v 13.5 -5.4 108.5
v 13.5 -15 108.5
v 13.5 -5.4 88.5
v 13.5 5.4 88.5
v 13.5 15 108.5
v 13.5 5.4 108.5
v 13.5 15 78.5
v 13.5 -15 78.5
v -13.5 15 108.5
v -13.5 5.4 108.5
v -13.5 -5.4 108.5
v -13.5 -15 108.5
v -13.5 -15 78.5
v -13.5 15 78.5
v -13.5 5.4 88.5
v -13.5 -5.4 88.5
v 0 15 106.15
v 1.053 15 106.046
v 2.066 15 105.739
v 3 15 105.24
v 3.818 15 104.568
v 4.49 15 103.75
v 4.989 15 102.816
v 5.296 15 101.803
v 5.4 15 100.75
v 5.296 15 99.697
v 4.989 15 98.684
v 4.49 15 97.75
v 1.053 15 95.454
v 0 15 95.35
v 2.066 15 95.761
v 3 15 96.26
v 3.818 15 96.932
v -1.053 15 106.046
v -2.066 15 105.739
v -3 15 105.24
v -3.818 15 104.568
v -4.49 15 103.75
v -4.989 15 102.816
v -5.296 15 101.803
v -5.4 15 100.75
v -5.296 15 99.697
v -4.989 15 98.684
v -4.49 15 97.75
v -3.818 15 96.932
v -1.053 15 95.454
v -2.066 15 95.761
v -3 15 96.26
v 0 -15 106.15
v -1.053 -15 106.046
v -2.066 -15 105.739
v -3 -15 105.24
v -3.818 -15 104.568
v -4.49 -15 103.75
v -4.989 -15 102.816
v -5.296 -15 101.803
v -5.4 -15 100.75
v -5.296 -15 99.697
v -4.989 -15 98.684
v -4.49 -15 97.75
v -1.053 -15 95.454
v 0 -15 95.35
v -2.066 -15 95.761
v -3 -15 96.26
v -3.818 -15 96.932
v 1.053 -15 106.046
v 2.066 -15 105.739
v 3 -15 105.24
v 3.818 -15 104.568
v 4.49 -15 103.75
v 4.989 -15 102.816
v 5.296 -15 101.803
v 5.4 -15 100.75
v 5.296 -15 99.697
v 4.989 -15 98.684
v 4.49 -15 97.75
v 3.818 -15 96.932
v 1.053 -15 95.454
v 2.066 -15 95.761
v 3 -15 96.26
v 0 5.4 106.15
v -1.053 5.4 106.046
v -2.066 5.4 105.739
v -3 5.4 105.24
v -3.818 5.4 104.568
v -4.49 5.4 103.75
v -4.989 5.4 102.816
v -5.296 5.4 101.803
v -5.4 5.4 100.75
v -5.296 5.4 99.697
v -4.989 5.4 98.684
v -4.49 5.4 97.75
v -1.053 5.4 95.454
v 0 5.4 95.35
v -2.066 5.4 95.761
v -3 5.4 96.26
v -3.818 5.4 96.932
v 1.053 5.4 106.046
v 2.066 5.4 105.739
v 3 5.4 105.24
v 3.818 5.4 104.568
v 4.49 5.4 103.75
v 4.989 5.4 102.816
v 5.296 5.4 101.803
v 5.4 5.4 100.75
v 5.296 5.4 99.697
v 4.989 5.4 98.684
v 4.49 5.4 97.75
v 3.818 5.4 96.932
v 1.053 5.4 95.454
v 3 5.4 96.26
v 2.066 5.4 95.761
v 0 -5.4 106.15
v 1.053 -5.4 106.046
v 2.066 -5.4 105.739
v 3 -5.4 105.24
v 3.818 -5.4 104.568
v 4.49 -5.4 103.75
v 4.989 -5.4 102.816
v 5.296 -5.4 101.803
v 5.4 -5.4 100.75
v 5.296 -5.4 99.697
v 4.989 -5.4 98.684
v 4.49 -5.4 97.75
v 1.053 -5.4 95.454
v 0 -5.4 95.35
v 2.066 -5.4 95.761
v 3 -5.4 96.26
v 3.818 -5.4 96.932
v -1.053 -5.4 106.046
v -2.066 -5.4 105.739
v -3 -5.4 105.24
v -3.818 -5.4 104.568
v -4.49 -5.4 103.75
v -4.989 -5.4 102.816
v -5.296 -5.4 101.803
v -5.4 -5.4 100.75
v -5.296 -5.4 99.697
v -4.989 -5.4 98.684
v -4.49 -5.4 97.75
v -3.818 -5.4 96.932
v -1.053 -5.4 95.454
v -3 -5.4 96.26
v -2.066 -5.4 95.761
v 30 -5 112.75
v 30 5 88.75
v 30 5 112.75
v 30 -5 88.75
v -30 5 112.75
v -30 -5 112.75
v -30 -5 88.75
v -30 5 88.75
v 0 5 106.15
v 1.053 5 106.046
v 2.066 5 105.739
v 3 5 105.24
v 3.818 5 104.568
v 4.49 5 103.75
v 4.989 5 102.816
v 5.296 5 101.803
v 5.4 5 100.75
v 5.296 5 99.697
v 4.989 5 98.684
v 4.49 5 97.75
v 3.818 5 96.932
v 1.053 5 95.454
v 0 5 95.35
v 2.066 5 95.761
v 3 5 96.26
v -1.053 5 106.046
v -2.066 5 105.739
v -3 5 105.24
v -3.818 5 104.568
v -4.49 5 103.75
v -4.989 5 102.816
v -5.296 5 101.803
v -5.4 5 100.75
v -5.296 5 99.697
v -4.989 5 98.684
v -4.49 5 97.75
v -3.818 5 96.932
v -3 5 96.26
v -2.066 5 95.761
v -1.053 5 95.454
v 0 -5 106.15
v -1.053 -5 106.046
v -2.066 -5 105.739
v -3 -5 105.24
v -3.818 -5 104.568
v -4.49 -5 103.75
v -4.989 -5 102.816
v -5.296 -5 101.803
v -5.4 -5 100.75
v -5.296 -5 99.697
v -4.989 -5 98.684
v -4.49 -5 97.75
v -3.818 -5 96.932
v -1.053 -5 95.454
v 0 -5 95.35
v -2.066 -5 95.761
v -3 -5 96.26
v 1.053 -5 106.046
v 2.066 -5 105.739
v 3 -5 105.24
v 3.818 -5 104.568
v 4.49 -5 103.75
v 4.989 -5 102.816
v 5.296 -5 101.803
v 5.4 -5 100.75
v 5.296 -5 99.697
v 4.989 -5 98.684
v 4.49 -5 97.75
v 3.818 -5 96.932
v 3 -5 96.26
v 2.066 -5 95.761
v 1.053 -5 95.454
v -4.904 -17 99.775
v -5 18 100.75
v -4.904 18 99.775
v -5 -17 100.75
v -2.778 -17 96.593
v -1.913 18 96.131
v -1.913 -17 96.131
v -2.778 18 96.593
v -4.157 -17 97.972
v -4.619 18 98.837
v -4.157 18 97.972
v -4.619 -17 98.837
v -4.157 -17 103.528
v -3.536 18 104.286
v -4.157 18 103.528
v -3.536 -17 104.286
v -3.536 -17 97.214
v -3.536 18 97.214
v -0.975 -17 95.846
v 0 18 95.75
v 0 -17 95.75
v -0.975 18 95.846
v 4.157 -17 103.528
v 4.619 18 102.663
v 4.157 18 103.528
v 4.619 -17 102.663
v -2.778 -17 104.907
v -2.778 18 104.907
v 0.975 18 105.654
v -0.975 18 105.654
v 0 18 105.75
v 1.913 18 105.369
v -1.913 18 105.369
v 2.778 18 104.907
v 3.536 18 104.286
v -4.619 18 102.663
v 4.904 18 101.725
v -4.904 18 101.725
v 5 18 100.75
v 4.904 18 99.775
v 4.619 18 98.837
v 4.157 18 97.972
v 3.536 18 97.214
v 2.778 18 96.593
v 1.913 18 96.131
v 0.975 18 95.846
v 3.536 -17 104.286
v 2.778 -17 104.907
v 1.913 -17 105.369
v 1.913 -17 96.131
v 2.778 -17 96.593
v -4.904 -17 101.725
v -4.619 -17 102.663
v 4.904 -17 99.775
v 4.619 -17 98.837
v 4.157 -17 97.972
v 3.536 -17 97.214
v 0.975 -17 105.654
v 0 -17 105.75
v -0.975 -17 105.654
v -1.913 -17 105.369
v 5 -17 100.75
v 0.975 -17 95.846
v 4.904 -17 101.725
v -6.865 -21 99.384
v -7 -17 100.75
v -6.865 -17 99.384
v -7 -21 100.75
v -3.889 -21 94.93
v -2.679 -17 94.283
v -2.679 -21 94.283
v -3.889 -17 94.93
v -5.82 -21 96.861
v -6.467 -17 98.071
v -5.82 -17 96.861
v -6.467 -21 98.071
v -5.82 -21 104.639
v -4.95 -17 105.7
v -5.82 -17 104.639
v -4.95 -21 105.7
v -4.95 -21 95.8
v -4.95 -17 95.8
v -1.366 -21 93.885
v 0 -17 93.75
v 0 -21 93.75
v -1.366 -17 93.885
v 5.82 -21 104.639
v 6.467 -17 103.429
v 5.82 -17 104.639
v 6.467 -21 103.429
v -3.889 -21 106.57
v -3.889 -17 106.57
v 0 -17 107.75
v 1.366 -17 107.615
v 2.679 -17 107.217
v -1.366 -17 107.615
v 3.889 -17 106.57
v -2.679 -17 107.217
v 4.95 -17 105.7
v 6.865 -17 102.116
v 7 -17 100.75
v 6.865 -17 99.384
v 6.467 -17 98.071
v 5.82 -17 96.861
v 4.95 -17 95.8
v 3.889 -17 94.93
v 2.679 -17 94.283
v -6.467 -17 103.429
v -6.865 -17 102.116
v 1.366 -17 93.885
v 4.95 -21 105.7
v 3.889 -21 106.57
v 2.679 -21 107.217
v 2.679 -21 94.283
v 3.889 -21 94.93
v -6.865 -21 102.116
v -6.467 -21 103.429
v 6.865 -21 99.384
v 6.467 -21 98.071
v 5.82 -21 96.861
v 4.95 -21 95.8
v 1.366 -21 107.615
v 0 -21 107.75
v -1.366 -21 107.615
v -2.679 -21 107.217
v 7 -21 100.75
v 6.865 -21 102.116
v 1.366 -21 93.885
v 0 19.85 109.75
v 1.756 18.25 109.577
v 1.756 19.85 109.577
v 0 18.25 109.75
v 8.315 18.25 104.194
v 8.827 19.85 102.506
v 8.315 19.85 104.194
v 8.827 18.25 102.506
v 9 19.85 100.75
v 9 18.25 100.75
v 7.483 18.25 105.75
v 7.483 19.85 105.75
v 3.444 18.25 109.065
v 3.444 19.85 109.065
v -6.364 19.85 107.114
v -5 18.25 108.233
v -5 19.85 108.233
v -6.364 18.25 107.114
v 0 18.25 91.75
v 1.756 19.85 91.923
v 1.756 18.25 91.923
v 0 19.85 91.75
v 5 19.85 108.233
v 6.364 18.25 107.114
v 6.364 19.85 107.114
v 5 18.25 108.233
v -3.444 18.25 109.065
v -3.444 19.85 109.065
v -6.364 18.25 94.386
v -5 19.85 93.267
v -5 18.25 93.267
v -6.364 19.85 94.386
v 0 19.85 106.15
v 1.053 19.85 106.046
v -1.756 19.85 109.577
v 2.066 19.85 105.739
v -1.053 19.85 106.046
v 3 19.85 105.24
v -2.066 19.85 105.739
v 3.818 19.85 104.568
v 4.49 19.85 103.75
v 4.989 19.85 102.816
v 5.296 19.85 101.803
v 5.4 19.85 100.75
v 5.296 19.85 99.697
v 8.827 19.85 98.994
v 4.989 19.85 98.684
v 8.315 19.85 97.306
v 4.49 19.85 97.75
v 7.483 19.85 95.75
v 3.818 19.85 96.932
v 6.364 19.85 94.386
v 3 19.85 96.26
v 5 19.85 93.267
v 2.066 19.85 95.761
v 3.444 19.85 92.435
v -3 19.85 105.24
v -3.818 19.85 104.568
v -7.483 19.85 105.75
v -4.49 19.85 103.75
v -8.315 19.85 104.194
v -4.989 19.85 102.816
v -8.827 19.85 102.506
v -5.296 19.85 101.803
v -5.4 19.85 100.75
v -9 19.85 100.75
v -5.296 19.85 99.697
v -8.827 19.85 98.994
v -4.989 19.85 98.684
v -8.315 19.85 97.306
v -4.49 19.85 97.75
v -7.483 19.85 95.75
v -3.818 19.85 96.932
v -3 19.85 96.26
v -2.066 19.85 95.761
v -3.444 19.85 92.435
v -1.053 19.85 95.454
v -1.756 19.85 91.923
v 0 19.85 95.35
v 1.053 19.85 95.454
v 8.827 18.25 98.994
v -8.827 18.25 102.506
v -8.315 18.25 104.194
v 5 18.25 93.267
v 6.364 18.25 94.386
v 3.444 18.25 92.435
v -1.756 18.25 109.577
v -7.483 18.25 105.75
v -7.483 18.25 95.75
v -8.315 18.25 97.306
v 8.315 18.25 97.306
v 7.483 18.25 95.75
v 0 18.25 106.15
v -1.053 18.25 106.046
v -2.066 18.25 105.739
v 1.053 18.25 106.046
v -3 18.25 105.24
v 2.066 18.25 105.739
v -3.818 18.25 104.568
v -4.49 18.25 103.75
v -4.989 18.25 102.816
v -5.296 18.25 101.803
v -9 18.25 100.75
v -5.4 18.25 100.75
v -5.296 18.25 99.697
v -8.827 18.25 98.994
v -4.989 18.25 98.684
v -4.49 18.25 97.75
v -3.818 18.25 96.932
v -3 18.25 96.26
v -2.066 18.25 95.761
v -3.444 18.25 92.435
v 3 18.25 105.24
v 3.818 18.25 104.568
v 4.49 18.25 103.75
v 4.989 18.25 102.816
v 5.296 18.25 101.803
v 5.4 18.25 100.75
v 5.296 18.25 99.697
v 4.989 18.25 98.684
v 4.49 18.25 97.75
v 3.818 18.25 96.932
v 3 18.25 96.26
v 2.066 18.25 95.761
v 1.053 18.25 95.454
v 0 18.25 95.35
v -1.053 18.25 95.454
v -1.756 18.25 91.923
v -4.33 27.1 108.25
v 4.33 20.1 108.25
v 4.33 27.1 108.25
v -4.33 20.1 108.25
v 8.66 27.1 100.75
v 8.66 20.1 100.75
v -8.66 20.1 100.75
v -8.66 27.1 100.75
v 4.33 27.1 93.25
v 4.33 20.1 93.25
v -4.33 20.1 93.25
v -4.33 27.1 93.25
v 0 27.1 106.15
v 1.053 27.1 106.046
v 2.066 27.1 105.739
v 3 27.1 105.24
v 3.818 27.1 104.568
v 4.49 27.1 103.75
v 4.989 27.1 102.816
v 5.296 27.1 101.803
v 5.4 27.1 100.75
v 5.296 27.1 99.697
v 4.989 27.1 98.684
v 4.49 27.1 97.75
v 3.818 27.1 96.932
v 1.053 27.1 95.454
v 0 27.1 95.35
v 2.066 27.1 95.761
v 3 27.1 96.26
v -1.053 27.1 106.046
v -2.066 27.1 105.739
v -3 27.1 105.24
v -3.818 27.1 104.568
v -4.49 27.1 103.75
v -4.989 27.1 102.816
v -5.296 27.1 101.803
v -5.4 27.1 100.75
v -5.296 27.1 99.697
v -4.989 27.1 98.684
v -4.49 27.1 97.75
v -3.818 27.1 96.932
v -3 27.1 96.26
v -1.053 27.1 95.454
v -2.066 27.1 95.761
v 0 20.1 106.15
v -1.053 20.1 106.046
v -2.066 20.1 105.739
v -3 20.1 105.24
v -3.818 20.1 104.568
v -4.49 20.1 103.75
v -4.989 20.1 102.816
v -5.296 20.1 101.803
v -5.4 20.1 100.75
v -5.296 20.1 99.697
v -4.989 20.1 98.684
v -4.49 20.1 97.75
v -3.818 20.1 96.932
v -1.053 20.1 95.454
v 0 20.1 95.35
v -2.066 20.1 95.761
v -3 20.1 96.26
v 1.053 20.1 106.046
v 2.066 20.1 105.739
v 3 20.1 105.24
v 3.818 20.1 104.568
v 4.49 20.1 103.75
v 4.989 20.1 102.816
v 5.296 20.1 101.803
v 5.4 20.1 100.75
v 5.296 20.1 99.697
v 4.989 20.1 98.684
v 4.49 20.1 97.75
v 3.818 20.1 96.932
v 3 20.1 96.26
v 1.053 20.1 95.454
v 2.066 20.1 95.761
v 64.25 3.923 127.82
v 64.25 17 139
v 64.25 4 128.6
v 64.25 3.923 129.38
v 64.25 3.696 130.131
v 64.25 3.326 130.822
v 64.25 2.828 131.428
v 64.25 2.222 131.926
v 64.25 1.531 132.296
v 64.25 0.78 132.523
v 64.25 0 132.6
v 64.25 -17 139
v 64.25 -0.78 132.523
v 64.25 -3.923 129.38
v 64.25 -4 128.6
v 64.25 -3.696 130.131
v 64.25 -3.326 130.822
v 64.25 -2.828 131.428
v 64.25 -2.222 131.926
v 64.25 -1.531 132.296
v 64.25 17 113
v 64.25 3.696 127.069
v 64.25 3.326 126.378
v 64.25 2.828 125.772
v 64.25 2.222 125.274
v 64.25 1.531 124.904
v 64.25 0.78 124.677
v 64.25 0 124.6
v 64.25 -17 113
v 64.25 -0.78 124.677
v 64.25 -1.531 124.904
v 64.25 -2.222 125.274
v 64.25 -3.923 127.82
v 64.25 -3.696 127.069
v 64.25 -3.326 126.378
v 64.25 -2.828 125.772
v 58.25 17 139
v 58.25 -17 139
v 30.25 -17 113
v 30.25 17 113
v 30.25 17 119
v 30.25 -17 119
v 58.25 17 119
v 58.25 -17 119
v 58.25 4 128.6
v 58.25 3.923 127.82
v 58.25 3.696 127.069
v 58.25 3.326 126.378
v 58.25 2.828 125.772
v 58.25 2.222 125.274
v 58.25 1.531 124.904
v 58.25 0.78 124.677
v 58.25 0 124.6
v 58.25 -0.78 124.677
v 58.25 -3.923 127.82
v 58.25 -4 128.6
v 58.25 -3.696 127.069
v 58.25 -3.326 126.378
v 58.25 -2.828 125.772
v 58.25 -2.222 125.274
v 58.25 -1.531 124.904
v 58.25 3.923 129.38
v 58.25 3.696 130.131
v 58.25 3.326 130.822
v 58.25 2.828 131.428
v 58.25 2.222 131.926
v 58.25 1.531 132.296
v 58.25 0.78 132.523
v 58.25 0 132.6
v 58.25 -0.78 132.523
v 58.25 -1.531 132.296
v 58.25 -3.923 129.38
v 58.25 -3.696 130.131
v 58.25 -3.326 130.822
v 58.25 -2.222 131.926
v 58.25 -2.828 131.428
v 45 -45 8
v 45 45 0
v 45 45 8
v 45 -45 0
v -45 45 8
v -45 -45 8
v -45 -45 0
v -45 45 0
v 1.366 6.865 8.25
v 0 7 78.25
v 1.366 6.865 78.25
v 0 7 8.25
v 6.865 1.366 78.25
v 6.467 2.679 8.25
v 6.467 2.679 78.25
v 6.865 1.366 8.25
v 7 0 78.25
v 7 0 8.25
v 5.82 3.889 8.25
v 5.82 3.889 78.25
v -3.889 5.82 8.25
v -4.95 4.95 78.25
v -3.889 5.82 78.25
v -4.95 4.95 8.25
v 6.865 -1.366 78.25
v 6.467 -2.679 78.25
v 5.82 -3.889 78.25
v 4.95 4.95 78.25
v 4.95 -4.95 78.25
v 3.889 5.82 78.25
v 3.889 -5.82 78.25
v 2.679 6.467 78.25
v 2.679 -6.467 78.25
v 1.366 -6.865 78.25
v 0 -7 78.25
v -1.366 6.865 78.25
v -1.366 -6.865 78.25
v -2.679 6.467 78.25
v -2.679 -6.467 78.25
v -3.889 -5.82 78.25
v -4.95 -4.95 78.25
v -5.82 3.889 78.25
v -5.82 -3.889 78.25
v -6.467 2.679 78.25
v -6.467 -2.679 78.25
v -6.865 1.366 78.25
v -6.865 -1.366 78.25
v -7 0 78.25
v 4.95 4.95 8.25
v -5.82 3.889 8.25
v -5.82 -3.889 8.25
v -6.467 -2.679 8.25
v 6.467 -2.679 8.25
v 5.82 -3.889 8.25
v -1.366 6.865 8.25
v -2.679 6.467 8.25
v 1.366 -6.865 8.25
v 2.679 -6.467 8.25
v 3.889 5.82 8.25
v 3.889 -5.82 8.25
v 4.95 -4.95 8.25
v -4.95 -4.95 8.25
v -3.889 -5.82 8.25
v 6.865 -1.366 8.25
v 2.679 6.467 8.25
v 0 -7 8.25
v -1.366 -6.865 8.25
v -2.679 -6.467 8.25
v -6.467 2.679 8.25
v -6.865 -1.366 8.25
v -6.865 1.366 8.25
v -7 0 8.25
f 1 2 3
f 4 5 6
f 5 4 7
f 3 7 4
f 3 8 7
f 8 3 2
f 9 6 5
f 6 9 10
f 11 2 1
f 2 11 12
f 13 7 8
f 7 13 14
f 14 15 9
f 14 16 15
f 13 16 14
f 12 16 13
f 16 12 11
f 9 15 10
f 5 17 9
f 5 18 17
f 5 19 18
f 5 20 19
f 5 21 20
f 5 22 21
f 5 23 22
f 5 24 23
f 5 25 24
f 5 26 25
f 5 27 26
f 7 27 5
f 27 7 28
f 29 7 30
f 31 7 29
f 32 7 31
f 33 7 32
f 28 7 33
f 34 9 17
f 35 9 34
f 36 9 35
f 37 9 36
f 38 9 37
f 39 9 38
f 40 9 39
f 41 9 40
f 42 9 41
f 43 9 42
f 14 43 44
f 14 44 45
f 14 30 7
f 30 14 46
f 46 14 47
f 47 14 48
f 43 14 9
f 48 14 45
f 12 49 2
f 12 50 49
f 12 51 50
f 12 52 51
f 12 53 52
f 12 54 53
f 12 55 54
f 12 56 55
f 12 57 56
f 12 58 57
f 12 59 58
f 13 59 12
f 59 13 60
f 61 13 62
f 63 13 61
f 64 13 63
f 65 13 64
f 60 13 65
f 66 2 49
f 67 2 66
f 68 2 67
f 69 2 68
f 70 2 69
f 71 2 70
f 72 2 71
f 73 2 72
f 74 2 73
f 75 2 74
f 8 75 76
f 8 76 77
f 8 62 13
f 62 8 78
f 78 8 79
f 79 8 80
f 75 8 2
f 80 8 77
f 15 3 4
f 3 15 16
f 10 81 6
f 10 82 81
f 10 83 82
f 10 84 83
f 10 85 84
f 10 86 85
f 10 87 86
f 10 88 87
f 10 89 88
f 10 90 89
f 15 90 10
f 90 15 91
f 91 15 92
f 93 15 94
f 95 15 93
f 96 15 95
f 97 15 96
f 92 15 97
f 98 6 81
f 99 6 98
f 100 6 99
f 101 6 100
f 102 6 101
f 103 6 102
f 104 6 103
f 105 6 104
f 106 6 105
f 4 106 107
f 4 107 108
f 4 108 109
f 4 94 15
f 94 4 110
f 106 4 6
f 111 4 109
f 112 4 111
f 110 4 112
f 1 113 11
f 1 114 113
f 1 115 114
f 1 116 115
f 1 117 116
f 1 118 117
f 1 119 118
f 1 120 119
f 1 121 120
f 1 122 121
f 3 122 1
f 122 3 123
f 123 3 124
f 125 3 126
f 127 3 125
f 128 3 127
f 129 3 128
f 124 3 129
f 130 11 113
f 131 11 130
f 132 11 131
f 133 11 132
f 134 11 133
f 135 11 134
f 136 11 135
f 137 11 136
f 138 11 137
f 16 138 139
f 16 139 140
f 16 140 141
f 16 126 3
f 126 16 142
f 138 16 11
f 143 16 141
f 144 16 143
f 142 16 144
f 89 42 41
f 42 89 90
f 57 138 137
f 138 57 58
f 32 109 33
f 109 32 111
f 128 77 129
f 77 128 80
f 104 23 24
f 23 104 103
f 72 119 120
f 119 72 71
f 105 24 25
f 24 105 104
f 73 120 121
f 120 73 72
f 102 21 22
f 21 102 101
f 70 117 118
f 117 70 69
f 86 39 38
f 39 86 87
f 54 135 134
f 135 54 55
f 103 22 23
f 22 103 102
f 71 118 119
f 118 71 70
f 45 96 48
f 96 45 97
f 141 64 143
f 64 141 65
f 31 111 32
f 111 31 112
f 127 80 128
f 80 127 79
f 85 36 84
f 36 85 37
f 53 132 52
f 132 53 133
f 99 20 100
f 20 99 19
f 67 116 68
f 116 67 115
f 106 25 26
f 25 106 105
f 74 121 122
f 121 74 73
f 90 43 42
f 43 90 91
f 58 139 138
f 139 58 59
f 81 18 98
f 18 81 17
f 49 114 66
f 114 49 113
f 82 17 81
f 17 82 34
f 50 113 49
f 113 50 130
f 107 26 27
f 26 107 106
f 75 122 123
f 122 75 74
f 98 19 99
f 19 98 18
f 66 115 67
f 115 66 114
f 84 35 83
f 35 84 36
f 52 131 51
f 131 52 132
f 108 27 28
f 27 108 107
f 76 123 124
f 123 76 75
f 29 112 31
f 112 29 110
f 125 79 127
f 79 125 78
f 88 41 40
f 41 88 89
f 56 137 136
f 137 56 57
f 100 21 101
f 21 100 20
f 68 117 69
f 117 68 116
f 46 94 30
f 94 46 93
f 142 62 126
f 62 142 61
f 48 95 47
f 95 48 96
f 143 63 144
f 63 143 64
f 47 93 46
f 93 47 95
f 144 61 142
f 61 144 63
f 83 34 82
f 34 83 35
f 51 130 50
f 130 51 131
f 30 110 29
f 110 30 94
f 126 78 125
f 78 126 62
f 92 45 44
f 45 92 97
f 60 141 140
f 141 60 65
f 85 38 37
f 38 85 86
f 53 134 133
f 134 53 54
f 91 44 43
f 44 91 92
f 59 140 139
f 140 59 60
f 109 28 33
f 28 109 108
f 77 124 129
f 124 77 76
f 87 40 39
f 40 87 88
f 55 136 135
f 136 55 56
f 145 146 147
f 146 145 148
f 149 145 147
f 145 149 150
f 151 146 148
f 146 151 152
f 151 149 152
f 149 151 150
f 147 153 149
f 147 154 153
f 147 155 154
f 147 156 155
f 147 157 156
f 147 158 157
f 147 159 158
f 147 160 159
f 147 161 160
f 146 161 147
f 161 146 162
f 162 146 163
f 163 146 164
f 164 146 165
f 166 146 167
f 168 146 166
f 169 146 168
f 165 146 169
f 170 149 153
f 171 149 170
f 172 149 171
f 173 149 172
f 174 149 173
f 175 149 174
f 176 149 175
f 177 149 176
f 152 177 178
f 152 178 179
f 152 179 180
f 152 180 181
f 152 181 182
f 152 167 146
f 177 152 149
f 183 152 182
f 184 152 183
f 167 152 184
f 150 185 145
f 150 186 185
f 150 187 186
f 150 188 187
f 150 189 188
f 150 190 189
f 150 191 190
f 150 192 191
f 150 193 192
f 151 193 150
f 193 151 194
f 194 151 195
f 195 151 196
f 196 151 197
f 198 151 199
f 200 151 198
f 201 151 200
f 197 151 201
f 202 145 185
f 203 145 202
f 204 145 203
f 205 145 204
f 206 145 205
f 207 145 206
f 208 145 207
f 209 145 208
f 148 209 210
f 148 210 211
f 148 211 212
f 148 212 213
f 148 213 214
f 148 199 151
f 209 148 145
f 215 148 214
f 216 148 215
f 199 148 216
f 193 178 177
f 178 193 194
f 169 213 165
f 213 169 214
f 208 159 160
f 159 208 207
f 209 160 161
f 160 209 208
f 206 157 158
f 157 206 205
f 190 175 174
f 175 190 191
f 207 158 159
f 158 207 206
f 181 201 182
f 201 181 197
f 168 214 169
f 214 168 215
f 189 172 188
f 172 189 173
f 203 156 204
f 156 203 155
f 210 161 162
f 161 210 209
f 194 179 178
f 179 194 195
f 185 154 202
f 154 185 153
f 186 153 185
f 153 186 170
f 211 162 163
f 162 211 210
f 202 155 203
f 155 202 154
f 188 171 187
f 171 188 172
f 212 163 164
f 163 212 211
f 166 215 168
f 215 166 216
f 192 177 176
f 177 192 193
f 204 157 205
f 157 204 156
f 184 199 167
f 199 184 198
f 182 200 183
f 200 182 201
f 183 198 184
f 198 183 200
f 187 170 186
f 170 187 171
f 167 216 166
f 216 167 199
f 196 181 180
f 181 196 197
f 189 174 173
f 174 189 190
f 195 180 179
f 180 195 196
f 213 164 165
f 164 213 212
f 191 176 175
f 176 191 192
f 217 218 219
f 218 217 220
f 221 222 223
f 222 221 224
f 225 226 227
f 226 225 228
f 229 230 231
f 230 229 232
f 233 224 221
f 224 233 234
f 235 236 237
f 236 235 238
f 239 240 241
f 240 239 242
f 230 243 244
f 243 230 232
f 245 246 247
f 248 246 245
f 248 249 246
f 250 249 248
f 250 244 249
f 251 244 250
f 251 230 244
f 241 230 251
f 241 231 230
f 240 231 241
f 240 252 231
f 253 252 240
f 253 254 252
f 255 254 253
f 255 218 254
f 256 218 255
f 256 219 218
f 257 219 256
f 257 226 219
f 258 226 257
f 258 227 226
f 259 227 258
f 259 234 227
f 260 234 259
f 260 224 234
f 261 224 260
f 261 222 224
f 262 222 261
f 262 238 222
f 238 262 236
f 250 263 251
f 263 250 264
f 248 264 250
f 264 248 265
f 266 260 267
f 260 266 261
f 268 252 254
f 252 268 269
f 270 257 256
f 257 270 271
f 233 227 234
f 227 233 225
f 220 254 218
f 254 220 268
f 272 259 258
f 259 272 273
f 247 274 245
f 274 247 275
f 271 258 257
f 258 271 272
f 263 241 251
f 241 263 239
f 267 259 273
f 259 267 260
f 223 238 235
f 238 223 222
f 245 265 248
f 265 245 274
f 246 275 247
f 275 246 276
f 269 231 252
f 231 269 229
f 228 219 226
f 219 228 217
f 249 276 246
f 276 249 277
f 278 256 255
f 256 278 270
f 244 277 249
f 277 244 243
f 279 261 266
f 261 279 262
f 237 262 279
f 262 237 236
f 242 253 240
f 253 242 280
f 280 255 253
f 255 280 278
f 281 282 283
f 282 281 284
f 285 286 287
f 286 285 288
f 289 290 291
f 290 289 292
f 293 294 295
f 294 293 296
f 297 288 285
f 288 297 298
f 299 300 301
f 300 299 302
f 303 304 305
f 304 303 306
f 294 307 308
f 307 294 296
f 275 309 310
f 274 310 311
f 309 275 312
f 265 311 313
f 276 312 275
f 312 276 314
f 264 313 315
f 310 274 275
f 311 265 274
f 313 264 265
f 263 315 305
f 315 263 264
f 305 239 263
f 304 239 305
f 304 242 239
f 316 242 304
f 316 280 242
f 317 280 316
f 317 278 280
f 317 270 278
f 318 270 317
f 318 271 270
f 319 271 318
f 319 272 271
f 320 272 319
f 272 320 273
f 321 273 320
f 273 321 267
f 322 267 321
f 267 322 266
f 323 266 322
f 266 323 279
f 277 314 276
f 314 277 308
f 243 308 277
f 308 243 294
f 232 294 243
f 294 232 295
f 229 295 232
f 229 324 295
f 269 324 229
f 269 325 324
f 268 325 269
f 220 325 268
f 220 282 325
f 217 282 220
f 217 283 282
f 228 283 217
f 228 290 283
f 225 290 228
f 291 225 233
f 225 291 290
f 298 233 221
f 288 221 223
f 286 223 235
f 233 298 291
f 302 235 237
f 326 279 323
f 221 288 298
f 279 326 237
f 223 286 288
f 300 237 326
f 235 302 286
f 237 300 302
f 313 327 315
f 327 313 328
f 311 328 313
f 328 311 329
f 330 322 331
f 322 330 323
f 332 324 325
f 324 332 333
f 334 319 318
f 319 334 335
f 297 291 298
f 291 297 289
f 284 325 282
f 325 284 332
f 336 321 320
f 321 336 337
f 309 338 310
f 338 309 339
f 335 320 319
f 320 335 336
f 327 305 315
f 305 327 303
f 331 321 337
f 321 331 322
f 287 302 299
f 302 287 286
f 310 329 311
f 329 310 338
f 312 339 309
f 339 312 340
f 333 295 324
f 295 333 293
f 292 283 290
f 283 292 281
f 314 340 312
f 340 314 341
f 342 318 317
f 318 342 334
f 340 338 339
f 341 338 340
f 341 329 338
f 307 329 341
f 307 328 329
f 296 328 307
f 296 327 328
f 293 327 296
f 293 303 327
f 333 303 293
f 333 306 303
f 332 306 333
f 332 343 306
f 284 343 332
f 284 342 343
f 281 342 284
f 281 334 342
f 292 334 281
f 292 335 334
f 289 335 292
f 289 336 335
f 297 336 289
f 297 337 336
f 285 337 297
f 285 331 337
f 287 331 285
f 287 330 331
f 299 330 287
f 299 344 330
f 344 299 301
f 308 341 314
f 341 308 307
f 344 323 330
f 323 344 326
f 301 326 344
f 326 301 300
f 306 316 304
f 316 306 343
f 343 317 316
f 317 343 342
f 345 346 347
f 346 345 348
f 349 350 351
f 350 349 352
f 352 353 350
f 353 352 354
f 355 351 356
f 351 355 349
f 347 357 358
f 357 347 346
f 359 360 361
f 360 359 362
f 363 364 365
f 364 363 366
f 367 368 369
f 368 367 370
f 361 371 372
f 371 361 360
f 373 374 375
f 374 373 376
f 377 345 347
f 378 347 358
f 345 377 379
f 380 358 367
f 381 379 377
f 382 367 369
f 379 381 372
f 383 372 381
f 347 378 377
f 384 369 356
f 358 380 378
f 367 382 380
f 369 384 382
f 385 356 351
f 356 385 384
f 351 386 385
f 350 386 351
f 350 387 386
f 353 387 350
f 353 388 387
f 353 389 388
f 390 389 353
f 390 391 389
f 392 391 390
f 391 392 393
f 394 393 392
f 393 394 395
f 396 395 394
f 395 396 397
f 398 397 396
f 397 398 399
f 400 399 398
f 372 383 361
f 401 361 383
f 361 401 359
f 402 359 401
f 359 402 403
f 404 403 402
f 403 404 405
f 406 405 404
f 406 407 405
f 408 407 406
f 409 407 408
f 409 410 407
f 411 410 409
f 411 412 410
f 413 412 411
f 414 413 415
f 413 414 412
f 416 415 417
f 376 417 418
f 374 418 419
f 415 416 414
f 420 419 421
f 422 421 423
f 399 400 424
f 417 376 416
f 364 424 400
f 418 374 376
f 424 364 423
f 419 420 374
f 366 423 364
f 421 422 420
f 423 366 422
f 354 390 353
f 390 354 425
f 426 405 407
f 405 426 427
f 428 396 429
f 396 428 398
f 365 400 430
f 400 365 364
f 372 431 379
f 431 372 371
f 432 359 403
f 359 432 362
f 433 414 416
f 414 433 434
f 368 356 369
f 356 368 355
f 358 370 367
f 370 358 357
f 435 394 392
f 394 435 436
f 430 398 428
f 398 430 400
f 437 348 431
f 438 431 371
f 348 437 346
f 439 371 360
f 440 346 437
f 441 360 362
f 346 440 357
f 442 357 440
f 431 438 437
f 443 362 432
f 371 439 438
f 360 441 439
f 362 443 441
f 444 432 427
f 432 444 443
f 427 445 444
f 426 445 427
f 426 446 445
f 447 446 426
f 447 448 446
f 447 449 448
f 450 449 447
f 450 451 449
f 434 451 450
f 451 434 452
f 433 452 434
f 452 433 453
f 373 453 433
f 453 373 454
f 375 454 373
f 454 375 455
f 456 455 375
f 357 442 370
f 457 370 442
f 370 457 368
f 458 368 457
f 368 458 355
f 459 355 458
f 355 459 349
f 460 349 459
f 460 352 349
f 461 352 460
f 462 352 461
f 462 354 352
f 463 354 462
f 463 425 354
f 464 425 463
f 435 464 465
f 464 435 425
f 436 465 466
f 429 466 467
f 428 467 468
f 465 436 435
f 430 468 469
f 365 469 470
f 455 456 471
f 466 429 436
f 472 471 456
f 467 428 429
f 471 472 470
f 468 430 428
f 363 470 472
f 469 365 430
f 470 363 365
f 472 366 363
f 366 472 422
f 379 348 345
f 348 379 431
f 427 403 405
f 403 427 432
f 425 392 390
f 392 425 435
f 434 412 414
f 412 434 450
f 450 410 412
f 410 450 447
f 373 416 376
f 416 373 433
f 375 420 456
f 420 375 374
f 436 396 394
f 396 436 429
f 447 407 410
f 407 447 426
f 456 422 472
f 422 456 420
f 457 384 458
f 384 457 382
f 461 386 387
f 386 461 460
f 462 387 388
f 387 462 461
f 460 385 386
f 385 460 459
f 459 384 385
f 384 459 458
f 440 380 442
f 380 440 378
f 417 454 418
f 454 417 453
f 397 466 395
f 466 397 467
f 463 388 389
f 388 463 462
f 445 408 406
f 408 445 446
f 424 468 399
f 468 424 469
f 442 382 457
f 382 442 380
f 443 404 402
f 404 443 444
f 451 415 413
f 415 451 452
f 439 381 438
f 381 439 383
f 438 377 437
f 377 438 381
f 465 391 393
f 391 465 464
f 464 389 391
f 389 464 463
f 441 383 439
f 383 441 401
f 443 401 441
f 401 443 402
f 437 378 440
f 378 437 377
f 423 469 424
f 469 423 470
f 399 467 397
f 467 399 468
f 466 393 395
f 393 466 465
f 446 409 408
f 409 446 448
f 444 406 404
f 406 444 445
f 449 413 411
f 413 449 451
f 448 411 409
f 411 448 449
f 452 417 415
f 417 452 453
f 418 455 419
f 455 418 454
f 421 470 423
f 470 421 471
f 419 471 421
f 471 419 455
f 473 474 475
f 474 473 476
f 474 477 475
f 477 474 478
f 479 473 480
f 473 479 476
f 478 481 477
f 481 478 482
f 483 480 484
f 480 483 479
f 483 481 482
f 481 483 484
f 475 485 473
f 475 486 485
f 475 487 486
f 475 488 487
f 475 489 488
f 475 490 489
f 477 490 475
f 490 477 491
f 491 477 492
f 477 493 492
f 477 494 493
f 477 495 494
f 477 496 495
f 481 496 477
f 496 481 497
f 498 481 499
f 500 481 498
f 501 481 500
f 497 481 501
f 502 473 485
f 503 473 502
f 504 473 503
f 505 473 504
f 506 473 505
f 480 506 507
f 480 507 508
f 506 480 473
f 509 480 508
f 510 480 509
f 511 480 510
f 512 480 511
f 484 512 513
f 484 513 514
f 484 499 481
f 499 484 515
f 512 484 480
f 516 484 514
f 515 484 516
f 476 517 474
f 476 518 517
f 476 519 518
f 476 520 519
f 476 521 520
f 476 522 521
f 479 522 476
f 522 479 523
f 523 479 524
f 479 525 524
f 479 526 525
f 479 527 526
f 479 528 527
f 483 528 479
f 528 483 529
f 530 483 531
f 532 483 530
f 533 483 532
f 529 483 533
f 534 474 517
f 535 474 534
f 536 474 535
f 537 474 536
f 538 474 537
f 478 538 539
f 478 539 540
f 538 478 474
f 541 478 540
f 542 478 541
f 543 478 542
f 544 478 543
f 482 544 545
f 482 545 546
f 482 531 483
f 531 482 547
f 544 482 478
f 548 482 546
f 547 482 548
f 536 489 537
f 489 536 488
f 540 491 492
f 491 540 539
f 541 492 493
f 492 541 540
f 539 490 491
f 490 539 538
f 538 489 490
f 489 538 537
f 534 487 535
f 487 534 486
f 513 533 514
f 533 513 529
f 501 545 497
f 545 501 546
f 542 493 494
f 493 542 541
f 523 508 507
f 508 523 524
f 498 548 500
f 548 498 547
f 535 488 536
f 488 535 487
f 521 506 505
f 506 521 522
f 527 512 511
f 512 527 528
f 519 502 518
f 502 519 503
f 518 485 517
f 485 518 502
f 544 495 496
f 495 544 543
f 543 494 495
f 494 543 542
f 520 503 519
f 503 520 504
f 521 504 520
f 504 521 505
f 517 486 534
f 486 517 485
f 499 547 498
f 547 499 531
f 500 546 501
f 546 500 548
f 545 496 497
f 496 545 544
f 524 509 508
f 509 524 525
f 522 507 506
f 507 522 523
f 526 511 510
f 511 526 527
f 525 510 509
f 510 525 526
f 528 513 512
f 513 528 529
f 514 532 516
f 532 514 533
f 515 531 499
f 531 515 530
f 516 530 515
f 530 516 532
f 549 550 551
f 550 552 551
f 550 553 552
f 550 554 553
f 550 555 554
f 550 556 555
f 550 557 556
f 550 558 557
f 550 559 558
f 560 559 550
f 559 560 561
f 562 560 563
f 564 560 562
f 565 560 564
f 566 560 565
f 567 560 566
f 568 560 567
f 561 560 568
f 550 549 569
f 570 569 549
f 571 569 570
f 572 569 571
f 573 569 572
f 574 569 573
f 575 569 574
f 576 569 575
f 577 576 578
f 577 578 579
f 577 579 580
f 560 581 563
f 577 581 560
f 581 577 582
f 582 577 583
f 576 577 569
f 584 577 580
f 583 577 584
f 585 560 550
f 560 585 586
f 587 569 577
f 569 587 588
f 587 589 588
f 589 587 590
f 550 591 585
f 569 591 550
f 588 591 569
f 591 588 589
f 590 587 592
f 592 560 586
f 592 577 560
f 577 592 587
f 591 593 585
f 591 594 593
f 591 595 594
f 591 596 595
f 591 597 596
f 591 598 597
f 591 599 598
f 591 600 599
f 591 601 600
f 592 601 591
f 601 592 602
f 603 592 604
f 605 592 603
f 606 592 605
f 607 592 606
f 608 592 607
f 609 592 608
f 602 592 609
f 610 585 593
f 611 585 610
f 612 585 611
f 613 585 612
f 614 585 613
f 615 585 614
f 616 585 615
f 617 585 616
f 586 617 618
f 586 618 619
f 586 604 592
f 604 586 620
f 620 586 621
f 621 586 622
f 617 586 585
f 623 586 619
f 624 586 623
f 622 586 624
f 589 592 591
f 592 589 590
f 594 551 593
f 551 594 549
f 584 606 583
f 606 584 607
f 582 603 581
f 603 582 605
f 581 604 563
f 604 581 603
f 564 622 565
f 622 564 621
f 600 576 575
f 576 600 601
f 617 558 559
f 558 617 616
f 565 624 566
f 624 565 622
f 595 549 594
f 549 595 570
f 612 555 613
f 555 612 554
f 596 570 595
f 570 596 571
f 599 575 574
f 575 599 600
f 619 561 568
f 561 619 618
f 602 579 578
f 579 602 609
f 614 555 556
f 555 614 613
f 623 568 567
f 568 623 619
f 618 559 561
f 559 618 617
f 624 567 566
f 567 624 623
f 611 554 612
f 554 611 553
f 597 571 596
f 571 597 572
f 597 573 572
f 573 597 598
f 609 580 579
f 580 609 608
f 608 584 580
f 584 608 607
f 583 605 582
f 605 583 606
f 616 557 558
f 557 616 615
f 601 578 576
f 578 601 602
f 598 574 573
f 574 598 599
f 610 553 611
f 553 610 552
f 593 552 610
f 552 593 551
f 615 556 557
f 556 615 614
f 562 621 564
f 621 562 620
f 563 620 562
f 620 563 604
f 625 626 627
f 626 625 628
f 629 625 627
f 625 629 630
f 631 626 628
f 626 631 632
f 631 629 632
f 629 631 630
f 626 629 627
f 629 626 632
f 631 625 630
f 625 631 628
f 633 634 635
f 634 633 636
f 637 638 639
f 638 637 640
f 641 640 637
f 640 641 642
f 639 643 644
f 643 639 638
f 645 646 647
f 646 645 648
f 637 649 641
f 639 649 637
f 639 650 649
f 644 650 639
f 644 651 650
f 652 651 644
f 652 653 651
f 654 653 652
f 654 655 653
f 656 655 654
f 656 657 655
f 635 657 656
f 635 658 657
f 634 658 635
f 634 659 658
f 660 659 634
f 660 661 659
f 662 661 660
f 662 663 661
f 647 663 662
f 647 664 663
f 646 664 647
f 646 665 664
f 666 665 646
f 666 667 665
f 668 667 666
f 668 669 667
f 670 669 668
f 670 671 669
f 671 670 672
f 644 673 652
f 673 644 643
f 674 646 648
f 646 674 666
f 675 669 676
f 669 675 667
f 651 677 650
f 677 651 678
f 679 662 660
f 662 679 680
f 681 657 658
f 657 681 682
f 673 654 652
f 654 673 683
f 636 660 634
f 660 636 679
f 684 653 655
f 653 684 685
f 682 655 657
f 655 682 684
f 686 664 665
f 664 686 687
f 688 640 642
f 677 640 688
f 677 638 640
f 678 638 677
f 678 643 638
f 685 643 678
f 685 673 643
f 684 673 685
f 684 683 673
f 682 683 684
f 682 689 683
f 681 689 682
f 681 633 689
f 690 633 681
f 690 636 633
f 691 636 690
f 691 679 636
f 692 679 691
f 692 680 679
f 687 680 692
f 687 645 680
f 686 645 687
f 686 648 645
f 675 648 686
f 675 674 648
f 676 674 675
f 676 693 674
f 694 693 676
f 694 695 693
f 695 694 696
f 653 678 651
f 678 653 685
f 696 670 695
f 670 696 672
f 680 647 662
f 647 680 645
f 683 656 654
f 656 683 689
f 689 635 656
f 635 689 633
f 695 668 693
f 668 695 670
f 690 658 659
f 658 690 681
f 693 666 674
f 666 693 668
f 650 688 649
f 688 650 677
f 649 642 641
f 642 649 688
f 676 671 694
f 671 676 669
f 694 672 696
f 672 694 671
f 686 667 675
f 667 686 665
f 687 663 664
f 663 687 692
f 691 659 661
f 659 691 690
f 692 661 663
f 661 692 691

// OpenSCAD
$fn = 32;

// ------------------------------------------------------------------------
// Lamp arm: column d14 x 70 mm, arm 60 mm
// Every part is its own module, assembly() places every instance.
// ------------------------------------------------------------------------

// --- part 1 ---
module lamp_base() {
  difference() {
    translate([-45, -45, 0]) cube([90, 90, 8]);
  }
}

// --- part 2 ---
module lamp_column() {
  cylinder(h = 70, d = 14);
}

// --- part 3 ---
module head_fork() {
  difference() {
    translate([-13.5, -15, 0]) cube([27, 30, 30]);
    translate([-14.5, -5.4, 10]) cube([29, 10.8, 21]);
    translate([0, 0, 22.25]) rotate([90, 0, 0]) cylinder(h = 32, d = 10.8, center = true);
  }
}

// --- part 4 ---
module lamp_arm() {
  difference() {
    translate([-30, -5, 0]) cube([60, 10, 24]);
    translate([0, 0, 12]) rotate([90, 0, 0]) cylinder(h = 12, d = 10.8, center = true);
  }
}

// --- part 5 ---
module arm_pin() {
  rotate([0, 90, 0]) cylinder(h = 36, d = 10, center = true);
  translate([-21, 0, 0]) rotate([0, 90, 0]) cylinder(h = 4, d = 14);
}

// --- part 6 ---
module arm_washer() {
  difference() {
      translate([0, 0, 0]) cylinder(h = 1.6, d = 18);
      translate([0, 0, -1]) cylinder(h = 3.6, d = 10.8);
    }
}

// --- part 7 ---
module arm_nut() {
  difference() {
    linear_extrude(height = 7) polygon(points = [[8.66, 0], [4.33, 7.5], [-4.33, 7.5], [-8.66, 0], [-4.33, -7.5], [4.33, -7.5]]);
    translate([0, 0, -1]) cylinder(h = 9, d = 10.8);
  }
}

// --- part 8 ---
module shade_bracket() {
  difference() {
    translate([-17, -17, 0]) cube([34, 34, 26]);
    translate([-18, -18, 6]) cube([29, 36, 21]);
    translate([14, 0, 15.6]) rotate([0, 90, 0]) cylinder(h = 8, d = 8, center = true);
  }
}

// --- assembly ---
module assembly() {
  color([0.80, 0.24, 0.20]) translate([0, 0, 0]) rotate([0, 0, 0]) lamp_base();
  color([0.20, 0.45, 0.75]) translate([0, 0, 8.25]) rotate([0, 0, 0]) lamp_column();
  color([0.25, 0.62, 0.32]) translate([0, 0, 78.5]) rotate([0, 0, 0]) head_fork();
  color([0.92, 0.70, 0.18]) translate([0, 0, 88.75]) rotate([0, 0, 0]) lamp_arm();
  color([0.58, 0.35, 0.70]) translate([0, 0, 100.75]) rotate([0, 0, 90]) arm_pin();
  color([0.16, 0.66, 0.66]) translate([0, 19.85, 100.75]) rotate([90, 0, 0]) arm_washer();
  color([0.85, 0.48, 0.18]) translate([0, 27.1, 100.75]) rotate([90, 0, 0]) arm_nut();
  color([0.55, 0.60, 0.65]) translate([47.25, 0, 113]) rotate([0, 0, 0]) shade_bracket();
}

assembly();
